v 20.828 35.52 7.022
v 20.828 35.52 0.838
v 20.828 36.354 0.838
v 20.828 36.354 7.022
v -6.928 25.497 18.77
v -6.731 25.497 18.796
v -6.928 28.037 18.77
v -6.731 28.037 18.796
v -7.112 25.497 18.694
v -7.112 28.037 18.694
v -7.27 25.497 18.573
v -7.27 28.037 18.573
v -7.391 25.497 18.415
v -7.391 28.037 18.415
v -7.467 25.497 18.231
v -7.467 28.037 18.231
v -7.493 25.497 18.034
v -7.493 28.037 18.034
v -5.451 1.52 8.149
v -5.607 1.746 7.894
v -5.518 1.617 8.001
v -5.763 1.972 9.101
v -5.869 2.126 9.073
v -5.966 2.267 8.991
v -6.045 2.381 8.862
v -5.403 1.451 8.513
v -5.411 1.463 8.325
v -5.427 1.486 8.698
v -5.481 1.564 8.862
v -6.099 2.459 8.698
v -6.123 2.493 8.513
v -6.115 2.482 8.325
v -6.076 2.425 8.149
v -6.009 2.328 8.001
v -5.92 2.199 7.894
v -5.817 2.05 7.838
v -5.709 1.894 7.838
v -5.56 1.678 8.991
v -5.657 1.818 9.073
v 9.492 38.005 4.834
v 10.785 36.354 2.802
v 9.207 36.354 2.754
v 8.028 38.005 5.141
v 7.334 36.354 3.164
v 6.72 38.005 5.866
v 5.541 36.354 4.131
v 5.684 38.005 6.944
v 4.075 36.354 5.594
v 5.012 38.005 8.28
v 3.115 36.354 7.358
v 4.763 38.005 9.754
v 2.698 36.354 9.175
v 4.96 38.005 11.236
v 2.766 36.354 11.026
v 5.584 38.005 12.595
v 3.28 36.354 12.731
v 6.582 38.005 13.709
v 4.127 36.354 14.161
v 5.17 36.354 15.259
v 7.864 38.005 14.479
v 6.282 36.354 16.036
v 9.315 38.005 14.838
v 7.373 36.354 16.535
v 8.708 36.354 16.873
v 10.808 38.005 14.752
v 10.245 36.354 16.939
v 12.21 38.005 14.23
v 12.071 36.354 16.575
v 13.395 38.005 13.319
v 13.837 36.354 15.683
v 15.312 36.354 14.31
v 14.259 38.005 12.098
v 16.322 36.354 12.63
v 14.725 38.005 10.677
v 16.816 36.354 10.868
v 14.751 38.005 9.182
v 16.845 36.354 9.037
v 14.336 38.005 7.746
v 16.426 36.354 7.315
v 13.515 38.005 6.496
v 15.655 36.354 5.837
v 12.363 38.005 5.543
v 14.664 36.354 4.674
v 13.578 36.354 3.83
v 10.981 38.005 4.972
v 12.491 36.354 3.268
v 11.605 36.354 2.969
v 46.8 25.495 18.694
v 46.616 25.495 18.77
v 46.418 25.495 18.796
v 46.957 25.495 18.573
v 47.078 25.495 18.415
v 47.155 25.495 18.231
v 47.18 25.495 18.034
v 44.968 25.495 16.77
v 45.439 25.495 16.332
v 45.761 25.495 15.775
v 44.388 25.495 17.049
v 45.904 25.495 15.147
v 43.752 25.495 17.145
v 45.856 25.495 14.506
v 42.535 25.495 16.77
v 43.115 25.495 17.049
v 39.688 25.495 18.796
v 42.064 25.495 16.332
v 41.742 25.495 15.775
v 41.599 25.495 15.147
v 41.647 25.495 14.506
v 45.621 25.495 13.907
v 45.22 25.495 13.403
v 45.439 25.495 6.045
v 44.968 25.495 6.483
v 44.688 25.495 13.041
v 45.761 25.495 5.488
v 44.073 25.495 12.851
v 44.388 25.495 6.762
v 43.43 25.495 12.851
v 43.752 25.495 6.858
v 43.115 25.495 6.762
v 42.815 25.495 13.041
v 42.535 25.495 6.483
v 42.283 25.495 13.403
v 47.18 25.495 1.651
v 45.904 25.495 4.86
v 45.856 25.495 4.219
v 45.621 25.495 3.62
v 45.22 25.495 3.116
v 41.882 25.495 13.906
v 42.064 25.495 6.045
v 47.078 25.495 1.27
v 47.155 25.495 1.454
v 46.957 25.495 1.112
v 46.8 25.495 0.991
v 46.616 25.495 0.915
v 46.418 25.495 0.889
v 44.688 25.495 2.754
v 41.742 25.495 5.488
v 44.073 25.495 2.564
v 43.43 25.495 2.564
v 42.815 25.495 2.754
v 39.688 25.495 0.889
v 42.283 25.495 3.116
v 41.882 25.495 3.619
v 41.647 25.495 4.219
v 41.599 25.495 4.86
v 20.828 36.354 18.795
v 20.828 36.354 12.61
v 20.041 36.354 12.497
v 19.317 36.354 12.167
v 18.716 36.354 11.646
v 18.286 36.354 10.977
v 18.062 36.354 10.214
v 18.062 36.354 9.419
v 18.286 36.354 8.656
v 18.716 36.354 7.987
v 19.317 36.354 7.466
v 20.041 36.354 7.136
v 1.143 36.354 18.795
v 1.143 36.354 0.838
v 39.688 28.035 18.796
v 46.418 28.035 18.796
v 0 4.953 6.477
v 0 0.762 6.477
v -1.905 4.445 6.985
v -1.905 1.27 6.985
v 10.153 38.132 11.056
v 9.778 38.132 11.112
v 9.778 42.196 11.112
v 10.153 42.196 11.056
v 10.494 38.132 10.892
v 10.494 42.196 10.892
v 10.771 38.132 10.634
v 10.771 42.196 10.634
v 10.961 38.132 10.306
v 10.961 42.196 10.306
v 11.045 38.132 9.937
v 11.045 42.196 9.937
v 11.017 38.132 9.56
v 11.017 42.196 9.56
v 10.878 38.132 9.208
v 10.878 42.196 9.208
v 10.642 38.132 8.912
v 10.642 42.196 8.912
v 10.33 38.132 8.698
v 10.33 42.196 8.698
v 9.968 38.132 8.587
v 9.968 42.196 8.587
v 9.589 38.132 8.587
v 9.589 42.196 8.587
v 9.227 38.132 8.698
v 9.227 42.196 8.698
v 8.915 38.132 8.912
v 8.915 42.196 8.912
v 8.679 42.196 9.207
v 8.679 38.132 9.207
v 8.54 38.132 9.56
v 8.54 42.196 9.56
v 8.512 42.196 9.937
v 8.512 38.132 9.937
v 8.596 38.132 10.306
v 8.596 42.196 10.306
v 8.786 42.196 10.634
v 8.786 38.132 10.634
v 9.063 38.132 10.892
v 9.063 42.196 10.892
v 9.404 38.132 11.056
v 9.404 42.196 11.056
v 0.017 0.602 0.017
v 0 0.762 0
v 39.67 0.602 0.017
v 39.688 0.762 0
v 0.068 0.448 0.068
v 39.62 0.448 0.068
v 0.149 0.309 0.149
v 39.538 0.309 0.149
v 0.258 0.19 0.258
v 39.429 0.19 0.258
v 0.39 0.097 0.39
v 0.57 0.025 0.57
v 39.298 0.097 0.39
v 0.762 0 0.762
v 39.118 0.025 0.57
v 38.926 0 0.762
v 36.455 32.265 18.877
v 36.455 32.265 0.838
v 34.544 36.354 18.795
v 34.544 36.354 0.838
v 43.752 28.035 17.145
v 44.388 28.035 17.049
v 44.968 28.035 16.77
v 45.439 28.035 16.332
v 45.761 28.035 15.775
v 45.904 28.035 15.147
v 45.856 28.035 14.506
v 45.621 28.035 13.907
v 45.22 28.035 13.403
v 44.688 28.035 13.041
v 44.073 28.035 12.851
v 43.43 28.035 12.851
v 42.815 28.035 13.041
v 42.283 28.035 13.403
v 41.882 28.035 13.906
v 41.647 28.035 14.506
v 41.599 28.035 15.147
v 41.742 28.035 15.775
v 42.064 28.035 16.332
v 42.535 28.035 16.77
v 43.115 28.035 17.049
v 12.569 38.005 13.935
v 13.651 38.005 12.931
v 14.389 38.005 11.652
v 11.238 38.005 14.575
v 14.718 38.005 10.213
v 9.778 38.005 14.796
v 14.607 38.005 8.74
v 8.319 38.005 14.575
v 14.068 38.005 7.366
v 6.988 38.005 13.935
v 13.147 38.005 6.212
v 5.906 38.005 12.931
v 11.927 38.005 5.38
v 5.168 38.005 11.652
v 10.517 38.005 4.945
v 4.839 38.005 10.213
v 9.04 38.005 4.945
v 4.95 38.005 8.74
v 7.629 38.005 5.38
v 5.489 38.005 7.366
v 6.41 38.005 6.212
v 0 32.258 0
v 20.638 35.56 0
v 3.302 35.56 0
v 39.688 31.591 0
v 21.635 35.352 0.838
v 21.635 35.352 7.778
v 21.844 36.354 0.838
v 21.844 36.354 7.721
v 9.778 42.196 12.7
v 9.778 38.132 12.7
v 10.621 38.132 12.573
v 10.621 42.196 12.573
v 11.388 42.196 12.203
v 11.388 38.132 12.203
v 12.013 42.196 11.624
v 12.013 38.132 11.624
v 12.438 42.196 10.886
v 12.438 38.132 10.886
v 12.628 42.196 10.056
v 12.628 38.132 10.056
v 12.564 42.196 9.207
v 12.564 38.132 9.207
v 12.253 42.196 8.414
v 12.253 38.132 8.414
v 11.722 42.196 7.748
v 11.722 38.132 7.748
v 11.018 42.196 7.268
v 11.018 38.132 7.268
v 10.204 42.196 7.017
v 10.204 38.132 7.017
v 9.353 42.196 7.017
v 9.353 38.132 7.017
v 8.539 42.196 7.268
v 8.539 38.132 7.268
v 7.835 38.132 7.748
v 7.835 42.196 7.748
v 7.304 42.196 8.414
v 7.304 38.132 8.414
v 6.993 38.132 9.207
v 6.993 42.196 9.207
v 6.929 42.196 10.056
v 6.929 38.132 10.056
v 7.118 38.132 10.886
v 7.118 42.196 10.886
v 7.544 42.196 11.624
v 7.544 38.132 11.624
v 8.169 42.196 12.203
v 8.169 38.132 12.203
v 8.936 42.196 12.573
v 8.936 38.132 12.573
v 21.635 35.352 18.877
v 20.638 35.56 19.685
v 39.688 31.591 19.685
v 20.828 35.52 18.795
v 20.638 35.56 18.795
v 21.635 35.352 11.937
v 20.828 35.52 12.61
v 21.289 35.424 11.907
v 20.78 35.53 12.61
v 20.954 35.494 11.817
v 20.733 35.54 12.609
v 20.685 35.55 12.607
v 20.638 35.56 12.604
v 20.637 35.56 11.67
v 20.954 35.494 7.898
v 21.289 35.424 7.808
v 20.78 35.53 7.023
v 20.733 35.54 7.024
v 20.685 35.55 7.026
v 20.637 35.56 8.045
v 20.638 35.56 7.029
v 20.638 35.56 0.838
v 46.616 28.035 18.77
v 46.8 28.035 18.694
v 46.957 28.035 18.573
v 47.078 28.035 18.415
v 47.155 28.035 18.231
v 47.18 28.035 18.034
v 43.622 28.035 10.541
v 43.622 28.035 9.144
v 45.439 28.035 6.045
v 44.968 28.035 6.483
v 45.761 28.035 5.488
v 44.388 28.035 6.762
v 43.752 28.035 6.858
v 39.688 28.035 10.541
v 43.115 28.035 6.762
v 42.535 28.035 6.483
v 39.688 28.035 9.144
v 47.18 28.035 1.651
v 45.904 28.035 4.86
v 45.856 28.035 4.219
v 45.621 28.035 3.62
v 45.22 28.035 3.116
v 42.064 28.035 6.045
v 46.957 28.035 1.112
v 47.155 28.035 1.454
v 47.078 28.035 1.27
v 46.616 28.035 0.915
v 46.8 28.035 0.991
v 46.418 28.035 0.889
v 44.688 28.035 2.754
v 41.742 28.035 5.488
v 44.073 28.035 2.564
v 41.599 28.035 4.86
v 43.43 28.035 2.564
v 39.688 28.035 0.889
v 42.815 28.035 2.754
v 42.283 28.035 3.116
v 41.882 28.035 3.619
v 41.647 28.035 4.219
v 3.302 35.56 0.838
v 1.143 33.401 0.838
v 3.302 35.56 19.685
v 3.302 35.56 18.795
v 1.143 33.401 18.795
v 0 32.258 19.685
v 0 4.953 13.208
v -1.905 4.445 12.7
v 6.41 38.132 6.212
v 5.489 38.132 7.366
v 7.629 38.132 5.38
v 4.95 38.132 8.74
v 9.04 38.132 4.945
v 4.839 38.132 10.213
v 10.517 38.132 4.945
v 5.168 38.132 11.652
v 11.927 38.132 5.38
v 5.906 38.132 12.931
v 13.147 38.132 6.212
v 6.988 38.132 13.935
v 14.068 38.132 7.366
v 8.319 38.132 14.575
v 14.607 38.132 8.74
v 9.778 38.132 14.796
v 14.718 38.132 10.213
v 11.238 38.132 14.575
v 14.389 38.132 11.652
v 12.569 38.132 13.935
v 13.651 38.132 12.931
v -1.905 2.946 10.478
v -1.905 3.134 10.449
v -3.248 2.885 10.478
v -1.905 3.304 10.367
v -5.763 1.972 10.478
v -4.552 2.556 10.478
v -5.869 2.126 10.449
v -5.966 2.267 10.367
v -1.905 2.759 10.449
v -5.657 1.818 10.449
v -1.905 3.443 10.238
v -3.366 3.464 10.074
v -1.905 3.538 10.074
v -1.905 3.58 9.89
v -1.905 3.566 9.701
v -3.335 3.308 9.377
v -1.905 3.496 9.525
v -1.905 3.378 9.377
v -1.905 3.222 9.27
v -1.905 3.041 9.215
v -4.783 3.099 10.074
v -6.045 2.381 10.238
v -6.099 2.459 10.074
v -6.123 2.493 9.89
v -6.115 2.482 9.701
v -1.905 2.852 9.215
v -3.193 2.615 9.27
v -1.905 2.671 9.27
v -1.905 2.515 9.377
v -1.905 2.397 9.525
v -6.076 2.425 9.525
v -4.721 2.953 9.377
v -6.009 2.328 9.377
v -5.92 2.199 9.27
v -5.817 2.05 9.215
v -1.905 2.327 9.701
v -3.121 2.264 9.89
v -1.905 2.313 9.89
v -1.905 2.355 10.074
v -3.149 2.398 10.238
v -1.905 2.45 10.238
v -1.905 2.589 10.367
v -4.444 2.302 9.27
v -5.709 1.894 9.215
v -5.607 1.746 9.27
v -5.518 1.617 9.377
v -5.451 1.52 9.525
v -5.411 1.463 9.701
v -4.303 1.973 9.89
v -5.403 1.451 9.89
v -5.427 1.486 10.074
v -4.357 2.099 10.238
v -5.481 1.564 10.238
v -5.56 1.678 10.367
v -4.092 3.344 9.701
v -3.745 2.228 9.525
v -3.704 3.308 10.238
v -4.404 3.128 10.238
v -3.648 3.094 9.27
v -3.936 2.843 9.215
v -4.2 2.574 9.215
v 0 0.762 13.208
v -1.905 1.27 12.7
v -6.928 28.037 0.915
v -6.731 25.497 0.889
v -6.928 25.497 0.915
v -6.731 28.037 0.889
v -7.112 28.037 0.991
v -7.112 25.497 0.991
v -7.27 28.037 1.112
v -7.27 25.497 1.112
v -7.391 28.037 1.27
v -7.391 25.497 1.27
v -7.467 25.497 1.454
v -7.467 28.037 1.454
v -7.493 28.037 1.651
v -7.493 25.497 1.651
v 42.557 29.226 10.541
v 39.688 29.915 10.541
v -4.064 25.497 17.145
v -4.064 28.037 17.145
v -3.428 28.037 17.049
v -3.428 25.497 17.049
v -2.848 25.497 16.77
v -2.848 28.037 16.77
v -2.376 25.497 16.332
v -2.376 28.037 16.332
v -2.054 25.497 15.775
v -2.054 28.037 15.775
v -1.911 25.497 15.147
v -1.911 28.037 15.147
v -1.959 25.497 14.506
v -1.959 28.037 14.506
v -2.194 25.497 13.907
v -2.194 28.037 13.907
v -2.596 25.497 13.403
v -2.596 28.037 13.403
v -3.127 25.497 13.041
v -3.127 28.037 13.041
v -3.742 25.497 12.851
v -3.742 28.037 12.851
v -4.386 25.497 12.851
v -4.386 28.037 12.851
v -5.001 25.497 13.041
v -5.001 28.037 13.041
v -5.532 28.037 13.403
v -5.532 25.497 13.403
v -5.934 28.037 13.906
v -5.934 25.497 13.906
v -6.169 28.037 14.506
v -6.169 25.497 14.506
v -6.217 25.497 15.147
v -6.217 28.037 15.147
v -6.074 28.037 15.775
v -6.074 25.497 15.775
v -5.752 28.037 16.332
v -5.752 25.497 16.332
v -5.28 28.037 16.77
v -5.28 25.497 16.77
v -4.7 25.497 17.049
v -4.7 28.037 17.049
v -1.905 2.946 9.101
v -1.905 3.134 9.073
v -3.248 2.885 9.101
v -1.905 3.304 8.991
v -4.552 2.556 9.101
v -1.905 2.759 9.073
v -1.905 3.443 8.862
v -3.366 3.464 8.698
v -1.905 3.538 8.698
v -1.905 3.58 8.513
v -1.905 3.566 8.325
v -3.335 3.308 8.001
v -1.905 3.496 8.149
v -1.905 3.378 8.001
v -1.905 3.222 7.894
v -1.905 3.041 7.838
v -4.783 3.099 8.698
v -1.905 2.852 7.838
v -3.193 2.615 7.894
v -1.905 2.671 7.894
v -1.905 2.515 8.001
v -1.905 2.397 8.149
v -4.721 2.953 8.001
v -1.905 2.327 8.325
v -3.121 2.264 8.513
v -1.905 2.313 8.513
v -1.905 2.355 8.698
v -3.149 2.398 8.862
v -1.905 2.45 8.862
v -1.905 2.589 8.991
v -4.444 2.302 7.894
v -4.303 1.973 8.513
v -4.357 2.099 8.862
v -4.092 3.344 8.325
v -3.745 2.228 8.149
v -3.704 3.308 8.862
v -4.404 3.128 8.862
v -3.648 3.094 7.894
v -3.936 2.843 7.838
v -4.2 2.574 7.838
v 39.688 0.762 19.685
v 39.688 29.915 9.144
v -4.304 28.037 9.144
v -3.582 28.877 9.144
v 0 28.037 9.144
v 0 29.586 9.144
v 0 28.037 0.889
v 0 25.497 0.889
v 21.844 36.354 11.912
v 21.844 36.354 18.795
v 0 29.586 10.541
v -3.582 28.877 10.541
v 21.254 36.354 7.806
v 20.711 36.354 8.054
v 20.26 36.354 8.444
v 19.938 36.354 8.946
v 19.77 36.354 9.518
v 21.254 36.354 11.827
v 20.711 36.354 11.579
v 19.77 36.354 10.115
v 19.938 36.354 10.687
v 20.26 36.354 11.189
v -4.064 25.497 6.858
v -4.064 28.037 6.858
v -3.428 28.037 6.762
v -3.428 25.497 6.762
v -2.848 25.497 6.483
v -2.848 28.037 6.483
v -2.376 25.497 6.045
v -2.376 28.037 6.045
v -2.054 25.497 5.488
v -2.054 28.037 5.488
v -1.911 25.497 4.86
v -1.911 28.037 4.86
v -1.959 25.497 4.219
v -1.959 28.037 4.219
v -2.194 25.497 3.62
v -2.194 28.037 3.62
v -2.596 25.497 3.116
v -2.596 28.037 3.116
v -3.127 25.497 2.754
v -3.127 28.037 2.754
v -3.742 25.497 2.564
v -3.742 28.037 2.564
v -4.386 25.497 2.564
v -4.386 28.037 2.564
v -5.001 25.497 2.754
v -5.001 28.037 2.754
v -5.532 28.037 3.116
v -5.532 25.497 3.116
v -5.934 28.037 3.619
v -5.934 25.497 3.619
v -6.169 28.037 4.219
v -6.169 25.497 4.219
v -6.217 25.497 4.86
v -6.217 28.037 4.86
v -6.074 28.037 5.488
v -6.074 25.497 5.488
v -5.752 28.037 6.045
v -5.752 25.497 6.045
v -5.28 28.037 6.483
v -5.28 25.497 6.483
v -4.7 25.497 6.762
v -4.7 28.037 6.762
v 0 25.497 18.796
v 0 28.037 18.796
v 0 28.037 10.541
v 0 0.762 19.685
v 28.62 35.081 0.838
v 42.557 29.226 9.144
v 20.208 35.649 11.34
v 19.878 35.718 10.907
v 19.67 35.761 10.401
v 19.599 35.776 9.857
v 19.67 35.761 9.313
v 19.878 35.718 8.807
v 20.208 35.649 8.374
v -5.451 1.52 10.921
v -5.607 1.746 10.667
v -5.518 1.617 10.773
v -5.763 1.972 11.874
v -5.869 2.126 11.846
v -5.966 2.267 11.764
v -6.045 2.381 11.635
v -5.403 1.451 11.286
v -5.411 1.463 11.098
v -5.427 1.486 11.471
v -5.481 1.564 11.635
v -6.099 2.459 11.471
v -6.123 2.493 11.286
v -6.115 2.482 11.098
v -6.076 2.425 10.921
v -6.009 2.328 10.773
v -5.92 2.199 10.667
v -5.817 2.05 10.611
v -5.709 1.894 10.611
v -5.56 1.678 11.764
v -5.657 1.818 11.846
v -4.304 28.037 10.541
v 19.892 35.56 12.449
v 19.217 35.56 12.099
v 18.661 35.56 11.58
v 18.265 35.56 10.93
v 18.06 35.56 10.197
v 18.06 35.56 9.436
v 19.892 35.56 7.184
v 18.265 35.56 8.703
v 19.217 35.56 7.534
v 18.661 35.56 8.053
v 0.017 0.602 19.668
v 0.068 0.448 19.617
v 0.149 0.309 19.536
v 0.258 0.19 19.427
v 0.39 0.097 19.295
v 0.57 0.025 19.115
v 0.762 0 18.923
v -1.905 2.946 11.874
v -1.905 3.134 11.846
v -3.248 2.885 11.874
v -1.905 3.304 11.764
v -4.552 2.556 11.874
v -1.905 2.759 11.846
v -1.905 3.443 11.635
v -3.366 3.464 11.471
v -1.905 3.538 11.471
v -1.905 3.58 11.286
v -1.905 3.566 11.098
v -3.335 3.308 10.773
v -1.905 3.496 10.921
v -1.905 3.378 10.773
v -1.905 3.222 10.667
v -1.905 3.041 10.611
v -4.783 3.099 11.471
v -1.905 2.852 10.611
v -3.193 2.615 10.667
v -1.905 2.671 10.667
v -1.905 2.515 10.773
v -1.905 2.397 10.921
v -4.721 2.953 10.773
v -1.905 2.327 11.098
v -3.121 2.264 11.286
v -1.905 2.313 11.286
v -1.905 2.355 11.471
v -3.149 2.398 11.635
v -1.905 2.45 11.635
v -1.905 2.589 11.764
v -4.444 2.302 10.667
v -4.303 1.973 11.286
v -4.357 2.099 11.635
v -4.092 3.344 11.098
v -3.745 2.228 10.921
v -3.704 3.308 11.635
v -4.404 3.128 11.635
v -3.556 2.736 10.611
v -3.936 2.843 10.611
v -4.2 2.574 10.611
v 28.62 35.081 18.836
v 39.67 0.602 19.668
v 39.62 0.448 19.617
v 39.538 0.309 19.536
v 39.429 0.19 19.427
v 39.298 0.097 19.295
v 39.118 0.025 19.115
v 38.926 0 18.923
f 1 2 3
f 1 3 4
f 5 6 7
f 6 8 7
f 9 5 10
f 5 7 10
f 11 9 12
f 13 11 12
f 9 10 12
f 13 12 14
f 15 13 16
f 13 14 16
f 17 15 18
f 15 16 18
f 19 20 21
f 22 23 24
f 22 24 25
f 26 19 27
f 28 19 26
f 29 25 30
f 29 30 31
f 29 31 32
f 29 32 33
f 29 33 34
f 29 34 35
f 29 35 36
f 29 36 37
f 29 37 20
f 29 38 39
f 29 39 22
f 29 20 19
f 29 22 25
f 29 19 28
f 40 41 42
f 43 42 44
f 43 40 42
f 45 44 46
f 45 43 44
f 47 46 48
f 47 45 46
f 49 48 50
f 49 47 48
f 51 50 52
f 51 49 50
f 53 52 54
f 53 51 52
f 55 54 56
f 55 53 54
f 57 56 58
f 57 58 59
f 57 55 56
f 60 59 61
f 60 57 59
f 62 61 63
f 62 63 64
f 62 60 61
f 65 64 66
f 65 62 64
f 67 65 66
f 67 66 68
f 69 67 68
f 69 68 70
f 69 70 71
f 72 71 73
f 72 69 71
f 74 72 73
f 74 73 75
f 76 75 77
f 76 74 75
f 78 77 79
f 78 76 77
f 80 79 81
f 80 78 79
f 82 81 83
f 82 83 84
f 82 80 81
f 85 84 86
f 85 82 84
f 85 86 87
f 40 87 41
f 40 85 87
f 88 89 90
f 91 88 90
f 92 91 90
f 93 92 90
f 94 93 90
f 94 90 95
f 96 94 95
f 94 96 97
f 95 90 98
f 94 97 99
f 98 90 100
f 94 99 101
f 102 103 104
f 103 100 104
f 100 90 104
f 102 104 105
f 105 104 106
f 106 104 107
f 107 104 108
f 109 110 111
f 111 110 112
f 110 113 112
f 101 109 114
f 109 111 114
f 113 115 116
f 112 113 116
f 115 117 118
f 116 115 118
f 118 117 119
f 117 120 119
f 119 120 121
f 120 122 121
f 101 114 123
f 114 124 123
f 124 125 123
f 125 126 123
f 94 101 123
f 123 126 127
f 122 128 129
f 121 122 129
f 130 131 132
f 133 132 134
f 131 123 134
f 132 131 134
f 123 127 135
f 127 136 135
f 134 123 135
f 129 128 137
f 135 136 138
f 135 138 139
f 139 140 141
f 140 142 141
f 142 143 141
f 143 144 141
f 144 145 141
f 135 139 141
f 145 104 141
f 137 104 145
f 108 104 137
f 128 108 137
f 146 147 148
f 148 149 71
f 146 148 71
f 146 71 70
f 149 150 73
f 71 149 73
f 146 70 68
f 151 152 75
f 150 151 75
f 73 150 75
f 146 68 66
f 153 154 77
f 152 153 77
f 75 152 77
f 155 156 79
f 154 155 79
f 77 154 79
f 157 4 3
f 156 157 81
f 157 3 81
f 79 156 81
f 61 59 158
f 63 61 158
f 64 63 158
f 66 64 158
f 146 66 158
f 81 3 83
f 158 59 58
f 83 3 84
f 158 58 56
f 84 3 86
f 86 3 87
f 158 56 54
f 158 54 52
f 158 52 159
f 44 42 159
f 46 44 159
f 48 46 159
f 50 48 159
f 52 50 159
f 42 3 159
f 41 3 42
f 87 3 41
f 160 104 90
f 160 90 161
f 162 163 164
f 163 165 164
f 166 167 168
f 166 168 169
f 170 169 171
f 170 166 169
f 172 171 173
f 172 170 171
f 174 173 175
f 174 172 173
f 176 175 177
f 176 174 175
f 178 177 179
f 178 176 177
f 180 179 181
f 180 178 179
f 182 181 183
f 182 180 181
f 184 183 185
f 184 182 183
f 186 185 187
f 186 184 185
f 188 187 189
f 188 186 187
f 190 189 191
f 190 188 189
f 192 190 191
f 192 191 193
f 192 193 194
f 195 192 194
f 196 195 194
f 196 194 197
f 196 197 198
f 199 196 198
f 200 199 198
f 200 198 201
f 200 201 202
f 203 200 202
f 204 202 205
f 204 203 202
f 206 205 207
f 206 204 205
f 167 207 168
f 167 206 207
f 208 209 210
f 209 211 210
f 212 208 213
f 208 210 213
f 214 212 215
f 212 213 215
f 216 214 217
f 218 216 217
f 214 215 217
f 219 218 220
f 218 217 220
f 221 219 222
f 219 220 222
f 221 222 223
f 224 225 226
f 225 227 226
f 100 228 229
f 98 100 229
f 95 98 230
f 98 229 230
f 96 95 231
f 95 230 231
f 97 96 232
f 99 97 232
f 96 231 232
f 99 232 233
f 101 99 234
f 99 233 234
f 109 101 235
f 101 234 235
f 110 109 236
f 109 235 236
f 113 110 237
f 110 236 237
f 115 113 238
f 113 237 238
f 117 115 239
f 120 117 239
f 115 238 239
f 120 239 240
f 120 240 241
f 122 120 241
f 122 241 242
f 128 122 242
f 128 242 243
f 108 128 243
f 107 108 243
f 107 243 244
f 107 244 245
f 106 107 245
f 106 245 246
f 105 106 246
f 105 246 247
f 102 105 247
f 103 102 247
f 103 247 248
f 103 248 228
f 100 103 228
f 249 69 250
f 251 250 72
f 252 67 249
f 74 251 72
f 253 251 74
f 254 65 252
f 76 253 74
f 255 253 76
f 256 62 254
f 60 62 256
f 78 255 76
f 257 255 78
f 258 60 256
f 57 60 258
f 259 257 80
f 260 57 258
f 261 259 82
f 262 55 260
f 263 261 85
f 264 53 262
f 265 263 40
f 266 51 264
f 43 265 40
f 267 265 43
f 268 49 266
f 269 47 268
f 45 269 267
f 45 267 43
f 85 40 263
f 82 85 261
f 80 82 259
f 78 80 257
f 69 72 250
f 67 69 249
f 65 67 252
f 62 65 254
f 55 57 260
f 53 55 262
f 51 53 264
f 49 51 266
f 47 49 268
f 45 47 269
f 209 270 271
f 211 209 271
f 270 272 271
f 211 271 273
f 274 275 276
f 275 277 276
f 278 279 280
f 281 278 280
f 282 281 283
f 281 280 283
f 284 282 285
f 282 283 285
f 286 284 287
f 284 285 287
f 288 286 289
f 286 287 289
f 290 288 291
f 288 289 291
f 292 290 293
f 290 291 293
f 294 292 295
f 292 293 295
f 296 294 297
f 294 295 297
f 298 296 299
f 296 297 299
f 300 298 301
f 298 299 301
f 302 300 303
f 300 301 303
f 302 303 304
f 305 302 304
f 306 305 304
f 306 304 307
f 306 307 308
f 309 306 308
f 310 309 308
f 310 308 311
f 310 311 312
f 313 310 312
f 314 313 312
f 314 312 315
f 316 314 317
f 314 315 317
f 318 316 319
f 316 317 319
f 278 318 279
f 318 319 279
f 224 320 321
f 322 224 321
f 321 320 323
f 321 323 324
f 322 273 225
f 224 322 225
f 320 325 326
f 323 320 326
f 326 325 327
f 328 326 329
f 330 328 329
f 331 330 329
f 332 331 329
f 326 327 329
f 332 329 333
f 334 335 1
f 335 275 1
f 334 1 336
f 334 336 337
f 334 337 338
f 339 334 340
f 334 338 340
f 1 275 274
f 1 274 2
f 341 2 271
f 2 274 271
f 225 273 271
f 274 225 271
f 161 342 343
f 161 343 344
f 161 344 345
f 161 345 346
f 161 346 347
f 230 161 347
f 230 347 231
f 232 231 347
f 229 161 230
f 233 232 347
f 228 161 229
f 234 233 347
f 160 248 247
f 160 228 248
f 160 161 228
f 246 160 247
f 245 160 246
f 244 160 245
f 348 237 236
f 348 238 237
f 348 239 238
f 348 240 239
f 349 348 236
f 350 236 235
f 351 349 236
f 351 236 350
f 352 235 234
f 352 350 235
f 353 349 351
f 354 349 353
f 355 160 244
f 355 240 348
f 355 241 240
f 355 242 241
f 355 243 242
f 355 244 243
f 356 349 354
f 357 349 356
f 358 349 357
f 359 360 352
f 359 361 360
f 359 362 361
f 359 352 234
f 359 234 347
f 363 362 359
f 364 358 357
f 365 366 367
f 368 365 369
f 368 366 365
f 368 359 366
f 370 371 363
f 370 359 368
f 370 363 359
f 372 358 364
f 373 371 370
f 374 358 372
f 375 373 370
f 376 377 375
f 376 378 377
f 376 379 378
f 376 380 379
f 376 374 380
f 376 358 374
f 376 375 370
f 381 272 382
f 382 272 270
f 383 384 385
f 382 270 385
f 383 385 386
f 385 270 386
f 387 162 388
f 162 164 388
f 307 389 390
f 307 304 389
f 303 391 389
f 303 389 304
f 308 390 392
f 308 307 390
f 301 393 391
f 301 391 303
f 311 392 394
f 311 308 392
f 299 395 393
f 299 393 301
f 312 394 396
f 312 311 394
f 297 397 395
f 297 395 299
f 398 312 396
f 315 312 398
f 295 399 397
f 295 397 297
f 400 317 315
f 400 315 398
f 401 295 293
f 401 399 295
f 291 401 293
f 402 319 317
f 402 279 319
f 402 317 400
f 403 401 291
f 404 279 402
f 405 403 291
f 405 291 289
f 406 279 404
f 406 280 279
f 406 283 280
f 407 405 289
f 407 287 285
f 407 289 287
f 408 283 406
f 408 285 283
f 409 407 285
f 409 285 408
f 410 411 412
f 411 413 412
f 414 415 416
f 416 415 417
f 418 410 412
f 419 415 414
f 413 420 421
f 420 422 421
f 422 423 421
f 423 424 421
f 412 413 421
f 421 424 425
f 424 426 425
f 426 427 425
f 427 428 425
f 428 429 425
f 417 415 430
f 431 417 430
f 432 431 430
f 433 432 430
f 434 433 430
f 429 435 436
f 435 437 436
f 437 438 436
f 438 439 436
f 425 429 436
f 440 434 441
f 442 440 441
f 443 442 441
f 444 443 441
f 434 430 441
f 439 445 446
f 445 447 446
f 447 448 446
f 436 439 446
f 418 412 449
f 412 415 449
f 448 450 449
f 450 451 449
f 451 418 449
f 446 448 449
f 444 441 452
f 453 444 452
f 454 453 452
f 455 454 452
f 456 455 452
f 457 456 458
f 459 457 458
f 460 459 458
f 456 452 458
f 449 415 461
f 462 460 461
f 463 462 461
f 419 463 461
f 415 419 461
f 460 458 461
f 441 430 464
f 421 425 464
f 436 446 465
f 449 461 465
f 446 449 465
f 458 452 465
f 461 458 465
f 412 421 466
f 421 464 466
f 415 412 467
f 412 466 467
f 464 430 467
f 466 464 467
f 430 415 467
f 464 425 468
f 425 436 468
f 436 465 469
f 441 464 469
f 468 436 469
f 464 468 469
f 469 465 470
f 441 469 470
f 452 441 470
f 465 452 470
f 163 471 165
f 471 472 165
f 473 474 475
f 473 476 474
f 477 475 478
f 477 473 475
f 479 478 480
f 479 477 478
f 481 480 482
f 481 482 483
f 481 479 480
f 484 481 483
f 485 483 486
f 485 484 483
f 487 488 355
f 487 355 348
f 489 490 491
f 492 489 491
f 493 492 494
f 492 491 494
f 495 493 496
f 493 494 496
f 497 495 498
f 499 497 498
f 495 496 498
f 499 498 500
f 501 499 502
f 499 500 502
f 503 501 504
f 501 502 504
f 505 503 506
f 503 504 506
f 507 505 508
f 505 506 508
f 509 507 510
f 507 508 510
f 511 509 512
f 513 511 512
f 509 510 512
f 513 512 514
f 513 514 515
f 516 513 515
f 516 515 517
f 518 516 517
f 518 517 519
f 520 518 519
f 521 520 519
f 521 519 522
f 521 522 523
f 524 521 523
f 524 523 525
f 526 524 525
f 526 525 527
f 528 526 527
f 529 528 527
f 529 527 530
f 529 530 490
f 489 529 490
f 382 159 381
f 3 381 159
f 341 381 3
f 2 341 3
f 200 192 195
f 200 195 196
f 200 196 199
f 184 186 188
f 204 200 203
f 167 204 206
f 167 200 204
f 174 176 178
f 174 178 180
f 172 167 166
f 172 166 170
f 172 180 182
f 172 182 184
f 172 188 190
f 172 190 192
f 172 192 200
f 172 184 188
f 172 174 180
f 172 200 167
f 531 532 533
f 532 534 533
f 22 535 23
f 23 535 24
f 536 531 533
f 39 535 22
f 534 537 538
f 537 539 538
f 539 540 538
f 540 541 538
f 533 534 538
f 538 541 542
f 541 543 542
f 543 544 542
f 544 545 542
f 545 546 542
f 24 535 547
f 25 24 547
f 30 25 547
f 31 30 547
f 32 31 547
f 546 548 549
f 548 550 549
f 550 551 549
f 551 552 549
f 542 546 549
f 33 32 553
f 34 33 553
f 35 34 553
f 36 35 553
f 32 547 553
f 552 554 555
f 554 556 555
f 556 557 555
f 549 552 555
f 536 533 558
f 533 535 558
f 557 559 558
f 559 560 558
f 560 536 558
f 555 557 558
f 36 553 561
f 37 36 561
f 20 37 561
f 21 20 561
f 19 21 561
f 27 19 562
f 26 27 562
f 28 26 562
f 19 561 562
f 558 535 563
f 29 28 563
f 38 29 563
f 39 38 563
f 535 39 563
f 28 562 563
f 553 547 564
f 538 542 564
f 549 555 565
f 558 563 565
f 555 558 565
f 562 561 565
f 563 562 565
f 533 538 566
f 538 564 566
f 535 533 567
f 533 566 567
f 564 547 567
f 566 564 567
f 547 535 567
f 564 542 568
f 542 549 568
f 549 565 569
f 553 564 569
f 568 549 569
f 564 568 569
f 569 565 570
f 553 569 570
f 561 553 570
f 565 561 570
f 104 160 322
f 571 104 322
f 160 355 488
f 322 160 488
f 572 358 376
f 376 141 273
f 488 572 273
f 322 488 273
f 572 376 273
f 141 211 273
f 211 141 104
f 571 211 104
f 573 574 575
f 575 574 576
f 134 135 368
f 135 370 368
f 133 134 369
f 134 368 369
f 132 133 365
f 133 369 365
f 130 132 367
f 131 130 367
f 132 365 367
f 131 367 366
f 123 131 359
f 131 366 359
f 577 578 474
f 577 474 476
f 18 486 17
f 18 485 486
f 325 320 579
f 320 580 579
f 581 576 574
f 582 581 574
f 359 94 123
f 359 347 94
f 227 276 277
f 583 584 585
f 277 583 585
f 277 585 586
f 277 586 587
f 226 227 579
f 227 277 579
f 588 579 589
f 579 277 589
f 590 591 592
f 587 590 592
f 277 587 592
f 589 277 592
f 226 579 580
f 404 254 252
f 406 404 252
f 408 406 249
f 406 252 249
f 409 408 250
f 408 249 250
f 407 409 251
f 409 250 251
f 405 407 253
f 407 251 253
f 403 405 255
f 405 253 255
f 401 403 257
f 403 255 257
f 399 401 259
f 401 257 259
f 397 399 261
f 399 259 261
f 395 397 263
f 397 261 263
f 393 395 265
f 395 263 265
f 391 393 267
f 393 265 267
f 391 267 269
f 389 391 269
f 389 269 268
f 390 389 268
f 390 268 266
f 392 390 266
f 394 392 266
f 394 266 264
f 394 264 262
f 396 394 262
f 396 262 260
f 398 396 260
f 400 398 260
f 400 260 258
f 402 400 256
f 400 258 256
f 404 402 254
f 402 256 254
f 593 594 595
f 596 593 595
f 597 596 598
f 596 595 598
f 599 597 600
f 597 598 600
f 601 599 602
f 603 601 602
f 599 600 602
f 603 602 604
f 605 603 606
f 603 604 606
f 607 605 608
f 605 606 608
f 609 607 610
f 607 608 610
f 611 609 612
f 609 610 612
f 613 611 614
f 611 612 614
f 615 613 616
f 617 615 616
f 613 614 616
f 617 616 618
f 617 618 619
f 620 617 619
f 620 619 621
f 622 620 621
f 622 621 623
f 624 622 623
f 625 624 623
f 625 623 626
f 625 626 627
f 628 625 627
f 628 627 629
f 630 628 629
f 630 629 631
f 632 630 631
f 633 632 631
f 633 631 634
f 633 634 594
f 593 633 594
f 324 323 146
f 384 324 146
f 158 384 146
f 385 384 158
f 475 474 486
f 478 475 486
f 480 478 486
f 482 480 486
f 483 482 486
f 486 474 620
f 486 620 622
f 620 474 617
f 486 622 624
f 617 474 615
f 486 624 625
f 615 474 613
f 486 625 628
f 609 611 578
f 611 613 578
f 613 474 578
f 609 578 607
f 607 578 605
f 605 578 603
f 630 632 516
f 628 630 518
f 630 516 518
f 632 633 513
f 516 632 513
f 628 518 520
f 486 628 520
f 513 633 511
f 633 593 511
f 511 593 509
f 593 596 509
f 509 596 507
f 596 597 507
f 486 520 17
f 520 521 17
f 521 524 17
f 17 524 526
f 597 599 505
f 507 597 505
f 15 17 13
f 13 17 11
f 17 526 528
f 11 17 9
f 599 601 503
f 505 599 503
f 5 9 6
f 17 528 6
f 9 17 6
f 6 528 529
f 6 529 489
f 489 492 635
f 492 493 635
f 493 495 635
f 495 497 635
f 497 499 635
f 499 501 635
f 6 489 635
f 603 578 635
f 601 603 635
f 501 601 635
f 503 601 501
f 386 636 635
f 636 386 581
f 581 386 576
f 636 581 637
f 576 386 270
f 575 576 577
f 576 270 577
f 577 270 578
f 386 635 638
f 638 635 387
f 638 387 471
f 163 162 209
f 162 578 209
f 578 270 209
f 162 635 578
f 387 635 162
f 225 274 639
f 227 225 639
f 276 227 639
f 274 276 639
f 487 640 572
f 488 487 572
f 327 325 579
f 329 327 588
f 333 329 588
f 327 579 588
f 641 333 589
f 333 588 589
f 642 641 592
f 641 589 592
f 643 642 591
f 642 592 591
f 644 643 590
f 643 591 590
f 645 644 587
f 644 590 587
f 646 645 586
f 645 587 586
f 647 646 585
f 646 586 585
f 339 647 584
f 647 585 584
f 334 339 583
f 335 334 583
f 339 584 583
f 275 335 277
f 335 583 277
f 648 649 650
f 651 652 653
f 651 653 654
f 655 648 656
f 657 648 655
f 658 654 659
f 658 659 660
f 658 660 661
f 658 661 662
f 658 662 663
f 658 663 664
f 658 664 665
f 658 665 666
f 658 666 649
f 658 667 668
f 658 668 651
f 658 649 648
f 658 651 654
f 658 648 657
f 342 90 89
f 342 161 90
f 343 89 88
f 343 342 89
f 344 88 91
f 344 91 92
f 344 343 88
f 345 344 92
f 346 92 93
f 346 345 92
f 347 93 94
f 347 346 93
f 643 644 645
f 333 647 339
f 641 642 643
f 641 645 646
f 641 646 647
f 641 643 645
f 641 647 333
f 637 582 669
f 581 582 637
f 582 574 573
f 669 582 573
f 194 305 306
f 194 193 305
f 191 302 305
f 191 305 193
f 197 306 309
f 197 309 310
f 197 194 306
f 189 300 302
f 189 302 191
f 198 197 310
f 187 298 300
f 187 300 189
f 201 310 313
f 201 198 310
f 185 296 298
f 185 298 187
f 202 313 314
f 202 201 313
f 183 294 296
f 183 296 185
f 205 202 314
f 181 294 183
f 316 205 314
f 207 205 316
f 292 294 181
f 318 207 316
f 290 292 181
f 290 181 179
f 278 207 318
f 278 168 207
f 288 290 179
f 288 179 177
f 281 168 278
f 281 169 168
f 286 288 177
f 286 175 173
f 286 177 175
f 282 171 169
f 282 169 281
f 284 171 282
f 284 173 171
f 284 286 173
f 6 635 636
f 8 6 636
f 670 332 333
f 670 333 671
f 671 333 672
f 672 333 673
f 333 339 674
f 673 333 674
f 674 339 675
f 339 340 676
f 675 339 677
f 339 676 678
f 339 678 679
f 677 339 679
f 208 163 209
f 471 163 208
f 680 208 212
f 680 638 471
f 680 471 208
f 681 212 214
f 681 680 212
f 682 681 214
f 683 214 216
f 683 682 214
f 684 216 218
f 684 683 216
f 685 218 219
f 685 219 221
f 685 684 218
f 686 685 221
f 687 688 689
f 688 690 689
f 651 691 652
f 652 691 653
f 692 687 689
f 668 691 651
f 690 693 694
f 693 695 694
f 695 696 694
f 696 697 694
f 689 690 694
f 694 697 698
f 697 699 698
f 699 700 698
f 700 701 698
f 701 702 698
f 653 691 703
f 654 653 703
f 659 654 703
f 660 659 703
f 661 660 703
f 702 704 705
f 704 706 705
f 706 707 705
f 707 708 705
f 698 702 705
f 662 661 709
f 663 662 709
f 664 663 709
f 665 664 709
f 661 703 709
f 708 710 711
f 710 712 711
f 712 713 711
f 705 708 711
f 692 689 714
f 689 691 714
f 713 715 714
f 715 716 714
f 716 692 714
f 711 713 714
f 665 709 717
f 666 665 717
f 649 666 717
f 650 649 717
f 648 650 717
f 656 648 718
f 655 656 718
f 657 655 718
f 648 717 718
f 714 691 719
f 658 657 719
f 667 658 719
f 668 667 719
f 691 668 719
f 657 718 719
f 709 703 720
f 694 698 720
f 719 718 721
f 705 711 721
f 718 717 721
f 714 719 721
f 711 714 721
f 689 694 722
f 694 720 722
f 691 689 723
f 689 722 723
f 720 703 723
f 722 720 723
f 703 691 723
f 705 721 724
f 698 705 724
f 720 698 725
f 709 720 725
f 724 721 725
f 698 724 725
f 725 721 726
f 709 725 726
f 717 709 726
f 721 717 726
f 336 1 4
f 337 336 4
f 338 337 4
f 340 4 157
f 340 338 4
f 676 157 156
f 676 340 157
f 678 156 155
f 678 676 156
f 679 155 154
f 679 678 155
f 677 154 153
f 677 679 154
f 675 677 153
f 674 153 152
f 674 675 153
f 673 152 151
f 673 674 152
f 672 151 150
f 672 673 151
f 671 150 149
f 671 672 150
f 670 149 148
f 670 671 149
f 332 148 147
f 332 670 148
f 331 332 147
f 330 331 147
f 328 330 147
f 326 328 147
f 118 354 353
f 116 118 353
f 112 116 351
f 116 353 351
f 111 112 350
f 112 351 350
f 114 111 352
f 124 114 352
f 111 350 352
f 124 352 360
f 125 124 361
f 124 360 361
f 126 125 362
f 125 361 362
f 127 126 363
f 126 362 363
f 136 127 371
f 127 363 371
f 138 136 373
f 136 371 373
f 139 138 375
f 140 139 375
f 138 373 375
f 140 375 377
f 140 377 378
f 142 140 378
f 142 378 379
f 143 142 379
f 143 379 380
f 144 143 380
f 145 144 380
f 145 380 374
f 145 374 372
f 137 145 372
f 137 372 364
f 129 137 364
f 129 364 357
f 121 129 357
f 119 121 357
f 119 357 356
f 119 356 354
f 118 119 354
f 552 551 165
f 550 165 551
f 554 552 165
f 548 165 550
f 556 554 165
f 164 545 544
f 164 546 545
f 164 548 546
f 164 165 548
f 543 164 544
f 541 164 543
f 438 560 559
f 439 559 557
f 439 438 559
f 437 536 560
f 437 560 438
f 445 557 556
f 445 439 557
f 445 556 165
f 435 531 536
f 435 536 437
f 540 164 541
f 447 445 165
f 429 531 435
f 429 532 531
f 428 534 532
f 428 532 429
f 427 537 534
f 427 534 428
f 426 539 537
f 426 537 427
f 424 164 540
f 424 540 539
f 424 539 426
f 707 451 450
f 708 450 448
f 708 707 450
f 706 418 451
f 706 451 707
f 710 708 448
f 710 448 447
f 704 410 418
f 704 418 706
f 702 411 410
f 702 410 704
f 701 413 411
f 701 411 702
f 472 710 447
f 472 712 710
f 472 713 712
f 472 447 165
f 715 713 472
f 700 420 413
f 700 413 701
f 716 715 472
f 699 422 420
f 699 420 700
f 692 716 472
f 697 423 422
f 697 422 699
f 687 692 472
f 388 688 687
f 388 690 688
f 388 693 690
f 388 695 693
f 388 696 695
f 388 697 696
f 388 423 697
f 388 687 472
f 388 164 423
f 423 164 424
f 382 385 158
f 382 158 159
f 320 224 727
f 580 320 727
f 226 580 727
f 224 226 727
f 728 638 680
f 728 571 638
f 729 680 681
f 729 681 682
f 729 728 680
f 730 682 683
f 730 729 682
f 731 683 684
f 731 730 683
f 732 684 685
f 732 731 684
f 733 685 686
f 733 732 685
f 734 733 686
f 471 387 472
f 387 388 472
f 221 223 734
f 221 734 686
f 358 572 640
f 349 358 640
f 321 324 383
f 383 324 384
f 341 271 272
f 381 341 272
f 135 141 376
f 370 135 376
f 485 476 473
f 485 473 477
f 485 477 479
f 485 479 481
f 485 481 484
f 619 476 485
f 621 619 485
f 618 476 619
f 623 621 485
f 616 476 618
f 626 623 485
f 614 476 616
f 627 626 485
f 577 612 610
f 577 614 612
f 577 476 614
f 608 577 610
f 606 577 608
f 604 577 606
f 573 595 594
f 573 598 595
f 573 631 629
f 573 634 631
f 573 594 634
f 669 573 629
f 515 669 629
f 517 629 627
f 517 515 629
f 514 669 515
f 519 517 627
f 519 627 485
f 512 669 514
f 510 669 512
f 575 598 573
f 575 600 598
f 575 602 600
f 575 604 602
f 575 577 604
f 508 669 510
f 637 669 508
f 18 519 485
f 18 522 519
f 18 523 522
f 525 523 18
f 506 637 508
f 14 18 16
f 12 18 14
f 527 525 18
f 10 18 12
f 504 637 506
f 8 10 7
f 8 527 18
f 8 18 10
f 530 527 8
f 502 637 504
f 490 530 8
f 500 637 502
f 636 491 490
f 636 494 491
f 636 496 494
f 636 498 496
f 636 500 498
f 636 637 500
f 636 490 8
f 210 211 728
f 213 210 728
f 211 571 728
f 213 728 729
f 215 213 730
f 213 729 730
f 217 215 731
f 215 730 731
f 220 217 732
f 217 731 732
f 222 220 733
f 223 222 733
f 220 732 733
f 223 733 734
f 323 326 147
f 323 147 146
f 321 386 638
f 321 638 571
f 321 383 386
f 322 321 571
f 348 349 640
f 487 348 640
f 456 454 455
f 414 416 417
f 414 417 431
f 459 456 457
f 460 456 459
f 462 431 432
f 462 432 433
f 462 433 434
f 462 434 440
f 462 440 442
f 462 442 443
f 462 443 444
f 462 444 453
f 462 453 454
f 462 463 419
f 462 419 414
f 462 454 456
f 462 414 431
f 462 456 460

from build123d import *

# Parameters (mm, degrees)
EXTRUDE1_DEPTH     = 19.685
CHAMFER1_SIZE      = 3.302
FILLET1_R          = 0.762
SKETCH2_W          = 17.907
SKETCH2_H          = 2.54
EXTRUDE2_DEPTH     = 7.493
SKETCH4_W          = 17.907
SKETCH4_H          = 2.54
EXTRUDE3_DEPTH     = 7.493
FILLET2_R          = 0.762
EXTRUDE4_DEPTH     = 36.35375
SKETCH10_R         = 2.159
CUT_EXTRUDE1_DEPTH = 36.35375
RIB2_START         = -0.6985
RIB2_DEPTH         = 1.397
RIB3_START         = -0.6985
RIB3_DEPTH         = 1.397
SKETCH16_R         = 5.0165
EXTRUDE5_DEPTH     = 1.651
SKETCH18_R         = 4.953
EXTRUDE6_DEPTH     = 0.127
SKETCH19_R         = 2.159
CUT_EXTRUDE2_DEPTH = 59.305619446
SKETCH20_R         = 2.8575
SKETCH20_R_2       = 1.27
EXTRUDE7_DEPTH     = 4.064
SKETCH22_W         = 5.715
SKETCH22_H         = 3.175
EXTRUDE8_DEPTH     = 1.905
SKETCH24_R         = 0.635


with BuildPart() as part:
    # Sketch1 → Extrude1 (new body)
    with BuildSketch(Plane.XY):
        Polygon((0, 0), (39.6875, 0), (39.6875, 31.59125), (20.6375, 35.56), (0, 35.56), align=None)
    extrude(amount=EXTRUDE1_DEPTH)

    # Chamfer1
    chamfer1_edges = [part.edges().sort_by_distance(p)[0] for p in [
        (0, 35.56, 9.8425),
    ]]
    chamfer(chamfer1_edges, length=CHAMFER1_SIZE)

    # Fillet1
    fillet1_edges = [part.edges().sort_by_distance(p)[0] for p in [
        (19.84375, 0, 0),
        (19.84375, 0, 19.685),
        (39.6875, 0, 9.8425),
        (0, 0, 9.8425),
    ]]
    fillet(fillet1_edges, radius=FILLET1_R)

    # Sketch2 → Extrude2 (add)
    with BuildSketch(Plane(origin=(39.6875, 0, 0), x_dir=(0, 0, -1), z_dir=(1, 0, 0))):
        with Locations((-9.8425, 26.76525)):
            Rectangle(SKETCH2_W, SKETCH2_H)
    extrude(amount=EXTRUDE2_DEPTH)

    # Sketch4 → Extrude3 (add)
    with BuildSketch(Plane.ZY):
        with Locations((9.8425, 26.76652)):
            Rectangle(SKETCH4_W, SKETCH4_H)
    extrude(amount=EXTRUDE3_DEPTH)

    # Fillet2
    fillet2_edges = [part.edges().sort_by_distance(p)[0] for p in [
        (47.1805, 26.76525, 18.796),
        (47.1805, 26.76525, 0.889),
        (-7.493, 26.76652, 0.889),
        (-7.493, 26.76652, 18.796),
    ]]
    fillet(fillet2_edges, radius=FILLET2_R)

    # Sketch5 → Extrude4 (add)
    with BuildSketch(Plane(origin=(0, 0, 0), x_dir=(1, 0, 0), z_dir=(0, 1, 0))):
        with BuildLine():
            Line((1.143, -0.837535442), (20.828, -0.837535442))
            Line((20.828, -0.837535442), (20.828, -7.022435442))
            ThreePointArc((20.828, -7.022435442), (18.034, -9.816435442), (20.828, -12.610435442))
            Line((20.828, -12.610435442), (20.828, -18.795335442))
            Line((20.828, -18.795335442), (1.143, -18.795335442))
            Line((1.143, -18.795335442), (1.143, -0.837535442))
        make_face()
    extrude(amount=EXTRUDE4_DEPTH)

    # Sketch9 → Loft1 section 0
    with BuildSketch(Plane(origin=(7.958631448, 38.201430948, 0), x_dir=(-0.9789804197376049, 0.20395425411200233, 0), z_dir=(0.20395425411200233, 0.9789804197376049, 0))):
        with BuildLine():
            Line((-29.108115578, 18.877249077), (-13.970346323, 18.877249077))
            Line((-13.970346323, 18.877249077), (-13.970346323, 11.936940395))
            ThreePointArc((-13.970346323, 11.936940395), (-11.890798187, 9.857392259), (-13.970346323, 7.777844123))
            Line((-13.970346323, 7.777844123), (-13.970346323, 0.837535442))
            Line((-13.970346323, 0.837535442), (-29.108115578, 0.837535442))
            Line((-29.108115578, 0.837535442), (-29.108115578, 18.877249077))
        make_face()
    # Sketch7 → Loft1 section 1
    with BuildSketch(Plane(origin=(0, 36.35375, 0), x_dir=(-1, 0, 0), z_dir=(0, 1, 0))):
        with BuildLine():
            Line((-21.844, 0.837535442), (-34.544, 0.837535442))
            Line((-34.544, 0.837535442), (-34.544, 18.795335442))
            Line((-34.544, 18.795335442), (-21.844, 18.795335442))
            Line((-21.844, 18.795335442), (-21.844, 11.911935442))
            ThreePointArc((-21.844, 11.911935442), (-19.7485, 9.816435442), (-21.844, 7.720935442))
            Line((-21.844, 7.720935442), (-21.844, 0.837535442))
        make_face()
    loft()

    # Sketch10 → Cut-Extrude1 (cut)
    with BuildSketch(Plane(origin=(0, 28.03525, 0), x_dir=(-1, 0, 0), z_dir=(0, 1, 0))):
        with Locations(Location((-43.7515, 4.699, 0), (0, 0, 90))):
            Circle(SKETCH10_R)
        with Locations(Location((-43.7515, 14.986, 0), (0, 0, 90))):
            Circle(SKETCH10_R)
    extrude(amount=-CUT_EXTRUDE1_DEPTH, mode=Mode.SUBTRACT)

    # Rib2: read off the stored shape, not the designer's step
    # Rib2 outline → Rib2 (add)
    with BuildSketch(Plane.XY.offset(9.8425).offset(RIB2_START)):
        Polygon((43.622065389, 28.03525), (42.556674437, 29.225981064), (39.6875, 29.914582929), (39.6875, 28.03525), align=None)
    extrude(amount=RIB2_DEPTH)

    # Rib3: read off the stored shape, not the designer's step
    # Rib3 outline → Rib3 (add)
    with BuildSketch(Plane.XY.offset(9.8425).offset(RIB3_START)):
        Polygon((0, 29.585656003), (-3.58232689, 28.876779051), (-4.304067283, 28.03652), (0, 28.03652), align=None)
    extrude(amount=RIB3_DEPTH)

    # Sketch16 → Extrude5 (add)
    with BuildSketch(Plane(origin=(0, 36.35375, 0), x_dir=(-1, 0, 0), z_dir=(0, 1, 0))):
        with Locations(Location((-9.77846774, 9.8425, 0), (0, 0, 270))):
            Circle(SKETCH16_R)
    extrude(amount=EXTRUDE5_DEPTH)

    # Loft2: read off the stored shape, not the designer's step
    # Loft2: loft between two sections, ruled curve by curve
    loft2_from = [
        Edge.make_bspline([(10.784981125, 36.35375, 2.802082768), (-3.29585334, 36.35375, 0.789055998), (-5.308880109, 36.35375, 14.869890463), (8.771954355, 36.35375, 16.882917232), (22.85278882, 36.35375, 18.895944002), (24.865815589, 36.35375, 4.815109537), (10.784981125, 36.35375, 2.802082768)], [0, 0, 0, 0, 0.5, 0.5, 0.5, 1, 1, 1, 1], 3, [1, 0.333333333, 0.333333333, 1, 0.333333333, 0.333333333, 1]),
    ]
    loft2_to = [
        Edge.make_bspline([(9.491795646, 38.00475, 4.834197757), (-0.52480884, 38.00475, 5.407541944), (0.048535347, 38.00475, 15.424146431), (10.065139834, 38.00475, 14.850802243), (20.08174432, 38.00475, 14.277458056), (19.508400133, 38.00475, 4.260853569), (9.491795646, 38.00475, 4.834197757)], [0, 0, 0, 0, 0.5, 0.5, 0.5, 1, 1, 1, 1], 3, [1, 0.333333333, 0.333333333, 1, 0.333333333, 0.333333333, 1]),
    ]
    loft2 = Solid(Shell([*[Face.make_surface_from_curves(loft2_from[k], loft2_to[k]) for k in range(1)], Face(Wire(loft2_from)), Face(Wire(loft2_to))]))
    add(loft2)

    # Sketch18 → Extrude6 (add)
    with BuildSketch(Plane(origin=(0, 38.00475, 0), x_dir=(-1, 0, 0), z_dir=(0, 1, 0))):
        with Locations(Location((-9.77846774, 9.8425, 0), (0, 0, 90))):
            Circle(SKETCH18_R)
    extrude(amount=EXTRUDE6_DEPTH)

    # Sketch19 → Cut-Extrude2 (cut, through all)
    with BuildSketch(Plane(origin=(0, 28.03652, 0), x_dir=(-1, 0, 0), z_dir=(0, 1, 0))):
        with Locations(Location((4.064, 4.699, 0), (0, 0, 90))):
            Circle(SKETCH19_R)
        with Locations(Location((4.064, 14.986, 0), (0, 0, 90))):
            Circle(SKETCH19_R)
    extrude(amount=-CUT_EXTRUDE2_DEPTH, mode=Mode.SUBTRACT)

    # Sketch20 → Extrude7 (add)
    with BuildSketch(Plane(origin=(0, 38.13175, 0), x_dir=(-1, 0, 0), z_dir=(0, 1, 0))):
        with Locations(Location((-9.77846774, 9.8425, 0), (0, 0, 90))):
            Circle(SKETCH20_R)
        with Locations(Location((-9.77846774, 9.8425, 0), (0, 0, 90))):
            Circle(SKETCH20_R_2, mode=Mode.SUBTRACT)
    extrude(amount=EXTRUDE7_DEPTH)

    # Sketch22 → Extrude8 (add)
    with BuildSketch(Plane.ZY):
        with Locations((9.8425, 2.8575)):
            Rectangle(SKETCH22_W, SKETCH22_H)
    extrude(amount=EXTRUDE8_DEPTH)

    # Sketch21 → section 0 of loft3
    with BuildSketch(Plane.ZY, mode=Mode.PRIVATE) as loft3_s0:
        with BuildLine():
            Line((6.477, 4.953), (13.208, 4.953))
            Line((13.208, 4.953), (13.208, 0.762))
            Line((13.208, 0.762), (6.477, 0.762))
            Line((6.477, 0.762), (6.477, 4.953))
        make_face()
    # loft up to a face of the part (loft3)
    loft([loft3_s0.sketch, part.faces().sort_by_distance((-1.905, 2.8575, 9.8425))[0]])

    # Sweep3: sweep along a path in Sketch23
    with BuildLine(Plane.XY.offset(9.8425)) as sweep3_path:
        ThreePointArc((-1.905, 2.946484605), (-3.908218654, 2.753050744), (-5.763136487, 1.972293764))
    # Sketch24 → Sweep3 (sweep)
    with BuildSketch(Plane.ZY.offset(1.905)):
        with Locations((9.8425, 2.946484605)):
            Circle(SKETCH24_R)
        with Locations((11.23883905, 2.946484605)):
            Circle(SKETCH24_R)
        with Locations((8.466018651, 2.946484605)):
            Circle(SKETCH24_R)
    sweep(path=sweep3_path.line)


solid = part.part
